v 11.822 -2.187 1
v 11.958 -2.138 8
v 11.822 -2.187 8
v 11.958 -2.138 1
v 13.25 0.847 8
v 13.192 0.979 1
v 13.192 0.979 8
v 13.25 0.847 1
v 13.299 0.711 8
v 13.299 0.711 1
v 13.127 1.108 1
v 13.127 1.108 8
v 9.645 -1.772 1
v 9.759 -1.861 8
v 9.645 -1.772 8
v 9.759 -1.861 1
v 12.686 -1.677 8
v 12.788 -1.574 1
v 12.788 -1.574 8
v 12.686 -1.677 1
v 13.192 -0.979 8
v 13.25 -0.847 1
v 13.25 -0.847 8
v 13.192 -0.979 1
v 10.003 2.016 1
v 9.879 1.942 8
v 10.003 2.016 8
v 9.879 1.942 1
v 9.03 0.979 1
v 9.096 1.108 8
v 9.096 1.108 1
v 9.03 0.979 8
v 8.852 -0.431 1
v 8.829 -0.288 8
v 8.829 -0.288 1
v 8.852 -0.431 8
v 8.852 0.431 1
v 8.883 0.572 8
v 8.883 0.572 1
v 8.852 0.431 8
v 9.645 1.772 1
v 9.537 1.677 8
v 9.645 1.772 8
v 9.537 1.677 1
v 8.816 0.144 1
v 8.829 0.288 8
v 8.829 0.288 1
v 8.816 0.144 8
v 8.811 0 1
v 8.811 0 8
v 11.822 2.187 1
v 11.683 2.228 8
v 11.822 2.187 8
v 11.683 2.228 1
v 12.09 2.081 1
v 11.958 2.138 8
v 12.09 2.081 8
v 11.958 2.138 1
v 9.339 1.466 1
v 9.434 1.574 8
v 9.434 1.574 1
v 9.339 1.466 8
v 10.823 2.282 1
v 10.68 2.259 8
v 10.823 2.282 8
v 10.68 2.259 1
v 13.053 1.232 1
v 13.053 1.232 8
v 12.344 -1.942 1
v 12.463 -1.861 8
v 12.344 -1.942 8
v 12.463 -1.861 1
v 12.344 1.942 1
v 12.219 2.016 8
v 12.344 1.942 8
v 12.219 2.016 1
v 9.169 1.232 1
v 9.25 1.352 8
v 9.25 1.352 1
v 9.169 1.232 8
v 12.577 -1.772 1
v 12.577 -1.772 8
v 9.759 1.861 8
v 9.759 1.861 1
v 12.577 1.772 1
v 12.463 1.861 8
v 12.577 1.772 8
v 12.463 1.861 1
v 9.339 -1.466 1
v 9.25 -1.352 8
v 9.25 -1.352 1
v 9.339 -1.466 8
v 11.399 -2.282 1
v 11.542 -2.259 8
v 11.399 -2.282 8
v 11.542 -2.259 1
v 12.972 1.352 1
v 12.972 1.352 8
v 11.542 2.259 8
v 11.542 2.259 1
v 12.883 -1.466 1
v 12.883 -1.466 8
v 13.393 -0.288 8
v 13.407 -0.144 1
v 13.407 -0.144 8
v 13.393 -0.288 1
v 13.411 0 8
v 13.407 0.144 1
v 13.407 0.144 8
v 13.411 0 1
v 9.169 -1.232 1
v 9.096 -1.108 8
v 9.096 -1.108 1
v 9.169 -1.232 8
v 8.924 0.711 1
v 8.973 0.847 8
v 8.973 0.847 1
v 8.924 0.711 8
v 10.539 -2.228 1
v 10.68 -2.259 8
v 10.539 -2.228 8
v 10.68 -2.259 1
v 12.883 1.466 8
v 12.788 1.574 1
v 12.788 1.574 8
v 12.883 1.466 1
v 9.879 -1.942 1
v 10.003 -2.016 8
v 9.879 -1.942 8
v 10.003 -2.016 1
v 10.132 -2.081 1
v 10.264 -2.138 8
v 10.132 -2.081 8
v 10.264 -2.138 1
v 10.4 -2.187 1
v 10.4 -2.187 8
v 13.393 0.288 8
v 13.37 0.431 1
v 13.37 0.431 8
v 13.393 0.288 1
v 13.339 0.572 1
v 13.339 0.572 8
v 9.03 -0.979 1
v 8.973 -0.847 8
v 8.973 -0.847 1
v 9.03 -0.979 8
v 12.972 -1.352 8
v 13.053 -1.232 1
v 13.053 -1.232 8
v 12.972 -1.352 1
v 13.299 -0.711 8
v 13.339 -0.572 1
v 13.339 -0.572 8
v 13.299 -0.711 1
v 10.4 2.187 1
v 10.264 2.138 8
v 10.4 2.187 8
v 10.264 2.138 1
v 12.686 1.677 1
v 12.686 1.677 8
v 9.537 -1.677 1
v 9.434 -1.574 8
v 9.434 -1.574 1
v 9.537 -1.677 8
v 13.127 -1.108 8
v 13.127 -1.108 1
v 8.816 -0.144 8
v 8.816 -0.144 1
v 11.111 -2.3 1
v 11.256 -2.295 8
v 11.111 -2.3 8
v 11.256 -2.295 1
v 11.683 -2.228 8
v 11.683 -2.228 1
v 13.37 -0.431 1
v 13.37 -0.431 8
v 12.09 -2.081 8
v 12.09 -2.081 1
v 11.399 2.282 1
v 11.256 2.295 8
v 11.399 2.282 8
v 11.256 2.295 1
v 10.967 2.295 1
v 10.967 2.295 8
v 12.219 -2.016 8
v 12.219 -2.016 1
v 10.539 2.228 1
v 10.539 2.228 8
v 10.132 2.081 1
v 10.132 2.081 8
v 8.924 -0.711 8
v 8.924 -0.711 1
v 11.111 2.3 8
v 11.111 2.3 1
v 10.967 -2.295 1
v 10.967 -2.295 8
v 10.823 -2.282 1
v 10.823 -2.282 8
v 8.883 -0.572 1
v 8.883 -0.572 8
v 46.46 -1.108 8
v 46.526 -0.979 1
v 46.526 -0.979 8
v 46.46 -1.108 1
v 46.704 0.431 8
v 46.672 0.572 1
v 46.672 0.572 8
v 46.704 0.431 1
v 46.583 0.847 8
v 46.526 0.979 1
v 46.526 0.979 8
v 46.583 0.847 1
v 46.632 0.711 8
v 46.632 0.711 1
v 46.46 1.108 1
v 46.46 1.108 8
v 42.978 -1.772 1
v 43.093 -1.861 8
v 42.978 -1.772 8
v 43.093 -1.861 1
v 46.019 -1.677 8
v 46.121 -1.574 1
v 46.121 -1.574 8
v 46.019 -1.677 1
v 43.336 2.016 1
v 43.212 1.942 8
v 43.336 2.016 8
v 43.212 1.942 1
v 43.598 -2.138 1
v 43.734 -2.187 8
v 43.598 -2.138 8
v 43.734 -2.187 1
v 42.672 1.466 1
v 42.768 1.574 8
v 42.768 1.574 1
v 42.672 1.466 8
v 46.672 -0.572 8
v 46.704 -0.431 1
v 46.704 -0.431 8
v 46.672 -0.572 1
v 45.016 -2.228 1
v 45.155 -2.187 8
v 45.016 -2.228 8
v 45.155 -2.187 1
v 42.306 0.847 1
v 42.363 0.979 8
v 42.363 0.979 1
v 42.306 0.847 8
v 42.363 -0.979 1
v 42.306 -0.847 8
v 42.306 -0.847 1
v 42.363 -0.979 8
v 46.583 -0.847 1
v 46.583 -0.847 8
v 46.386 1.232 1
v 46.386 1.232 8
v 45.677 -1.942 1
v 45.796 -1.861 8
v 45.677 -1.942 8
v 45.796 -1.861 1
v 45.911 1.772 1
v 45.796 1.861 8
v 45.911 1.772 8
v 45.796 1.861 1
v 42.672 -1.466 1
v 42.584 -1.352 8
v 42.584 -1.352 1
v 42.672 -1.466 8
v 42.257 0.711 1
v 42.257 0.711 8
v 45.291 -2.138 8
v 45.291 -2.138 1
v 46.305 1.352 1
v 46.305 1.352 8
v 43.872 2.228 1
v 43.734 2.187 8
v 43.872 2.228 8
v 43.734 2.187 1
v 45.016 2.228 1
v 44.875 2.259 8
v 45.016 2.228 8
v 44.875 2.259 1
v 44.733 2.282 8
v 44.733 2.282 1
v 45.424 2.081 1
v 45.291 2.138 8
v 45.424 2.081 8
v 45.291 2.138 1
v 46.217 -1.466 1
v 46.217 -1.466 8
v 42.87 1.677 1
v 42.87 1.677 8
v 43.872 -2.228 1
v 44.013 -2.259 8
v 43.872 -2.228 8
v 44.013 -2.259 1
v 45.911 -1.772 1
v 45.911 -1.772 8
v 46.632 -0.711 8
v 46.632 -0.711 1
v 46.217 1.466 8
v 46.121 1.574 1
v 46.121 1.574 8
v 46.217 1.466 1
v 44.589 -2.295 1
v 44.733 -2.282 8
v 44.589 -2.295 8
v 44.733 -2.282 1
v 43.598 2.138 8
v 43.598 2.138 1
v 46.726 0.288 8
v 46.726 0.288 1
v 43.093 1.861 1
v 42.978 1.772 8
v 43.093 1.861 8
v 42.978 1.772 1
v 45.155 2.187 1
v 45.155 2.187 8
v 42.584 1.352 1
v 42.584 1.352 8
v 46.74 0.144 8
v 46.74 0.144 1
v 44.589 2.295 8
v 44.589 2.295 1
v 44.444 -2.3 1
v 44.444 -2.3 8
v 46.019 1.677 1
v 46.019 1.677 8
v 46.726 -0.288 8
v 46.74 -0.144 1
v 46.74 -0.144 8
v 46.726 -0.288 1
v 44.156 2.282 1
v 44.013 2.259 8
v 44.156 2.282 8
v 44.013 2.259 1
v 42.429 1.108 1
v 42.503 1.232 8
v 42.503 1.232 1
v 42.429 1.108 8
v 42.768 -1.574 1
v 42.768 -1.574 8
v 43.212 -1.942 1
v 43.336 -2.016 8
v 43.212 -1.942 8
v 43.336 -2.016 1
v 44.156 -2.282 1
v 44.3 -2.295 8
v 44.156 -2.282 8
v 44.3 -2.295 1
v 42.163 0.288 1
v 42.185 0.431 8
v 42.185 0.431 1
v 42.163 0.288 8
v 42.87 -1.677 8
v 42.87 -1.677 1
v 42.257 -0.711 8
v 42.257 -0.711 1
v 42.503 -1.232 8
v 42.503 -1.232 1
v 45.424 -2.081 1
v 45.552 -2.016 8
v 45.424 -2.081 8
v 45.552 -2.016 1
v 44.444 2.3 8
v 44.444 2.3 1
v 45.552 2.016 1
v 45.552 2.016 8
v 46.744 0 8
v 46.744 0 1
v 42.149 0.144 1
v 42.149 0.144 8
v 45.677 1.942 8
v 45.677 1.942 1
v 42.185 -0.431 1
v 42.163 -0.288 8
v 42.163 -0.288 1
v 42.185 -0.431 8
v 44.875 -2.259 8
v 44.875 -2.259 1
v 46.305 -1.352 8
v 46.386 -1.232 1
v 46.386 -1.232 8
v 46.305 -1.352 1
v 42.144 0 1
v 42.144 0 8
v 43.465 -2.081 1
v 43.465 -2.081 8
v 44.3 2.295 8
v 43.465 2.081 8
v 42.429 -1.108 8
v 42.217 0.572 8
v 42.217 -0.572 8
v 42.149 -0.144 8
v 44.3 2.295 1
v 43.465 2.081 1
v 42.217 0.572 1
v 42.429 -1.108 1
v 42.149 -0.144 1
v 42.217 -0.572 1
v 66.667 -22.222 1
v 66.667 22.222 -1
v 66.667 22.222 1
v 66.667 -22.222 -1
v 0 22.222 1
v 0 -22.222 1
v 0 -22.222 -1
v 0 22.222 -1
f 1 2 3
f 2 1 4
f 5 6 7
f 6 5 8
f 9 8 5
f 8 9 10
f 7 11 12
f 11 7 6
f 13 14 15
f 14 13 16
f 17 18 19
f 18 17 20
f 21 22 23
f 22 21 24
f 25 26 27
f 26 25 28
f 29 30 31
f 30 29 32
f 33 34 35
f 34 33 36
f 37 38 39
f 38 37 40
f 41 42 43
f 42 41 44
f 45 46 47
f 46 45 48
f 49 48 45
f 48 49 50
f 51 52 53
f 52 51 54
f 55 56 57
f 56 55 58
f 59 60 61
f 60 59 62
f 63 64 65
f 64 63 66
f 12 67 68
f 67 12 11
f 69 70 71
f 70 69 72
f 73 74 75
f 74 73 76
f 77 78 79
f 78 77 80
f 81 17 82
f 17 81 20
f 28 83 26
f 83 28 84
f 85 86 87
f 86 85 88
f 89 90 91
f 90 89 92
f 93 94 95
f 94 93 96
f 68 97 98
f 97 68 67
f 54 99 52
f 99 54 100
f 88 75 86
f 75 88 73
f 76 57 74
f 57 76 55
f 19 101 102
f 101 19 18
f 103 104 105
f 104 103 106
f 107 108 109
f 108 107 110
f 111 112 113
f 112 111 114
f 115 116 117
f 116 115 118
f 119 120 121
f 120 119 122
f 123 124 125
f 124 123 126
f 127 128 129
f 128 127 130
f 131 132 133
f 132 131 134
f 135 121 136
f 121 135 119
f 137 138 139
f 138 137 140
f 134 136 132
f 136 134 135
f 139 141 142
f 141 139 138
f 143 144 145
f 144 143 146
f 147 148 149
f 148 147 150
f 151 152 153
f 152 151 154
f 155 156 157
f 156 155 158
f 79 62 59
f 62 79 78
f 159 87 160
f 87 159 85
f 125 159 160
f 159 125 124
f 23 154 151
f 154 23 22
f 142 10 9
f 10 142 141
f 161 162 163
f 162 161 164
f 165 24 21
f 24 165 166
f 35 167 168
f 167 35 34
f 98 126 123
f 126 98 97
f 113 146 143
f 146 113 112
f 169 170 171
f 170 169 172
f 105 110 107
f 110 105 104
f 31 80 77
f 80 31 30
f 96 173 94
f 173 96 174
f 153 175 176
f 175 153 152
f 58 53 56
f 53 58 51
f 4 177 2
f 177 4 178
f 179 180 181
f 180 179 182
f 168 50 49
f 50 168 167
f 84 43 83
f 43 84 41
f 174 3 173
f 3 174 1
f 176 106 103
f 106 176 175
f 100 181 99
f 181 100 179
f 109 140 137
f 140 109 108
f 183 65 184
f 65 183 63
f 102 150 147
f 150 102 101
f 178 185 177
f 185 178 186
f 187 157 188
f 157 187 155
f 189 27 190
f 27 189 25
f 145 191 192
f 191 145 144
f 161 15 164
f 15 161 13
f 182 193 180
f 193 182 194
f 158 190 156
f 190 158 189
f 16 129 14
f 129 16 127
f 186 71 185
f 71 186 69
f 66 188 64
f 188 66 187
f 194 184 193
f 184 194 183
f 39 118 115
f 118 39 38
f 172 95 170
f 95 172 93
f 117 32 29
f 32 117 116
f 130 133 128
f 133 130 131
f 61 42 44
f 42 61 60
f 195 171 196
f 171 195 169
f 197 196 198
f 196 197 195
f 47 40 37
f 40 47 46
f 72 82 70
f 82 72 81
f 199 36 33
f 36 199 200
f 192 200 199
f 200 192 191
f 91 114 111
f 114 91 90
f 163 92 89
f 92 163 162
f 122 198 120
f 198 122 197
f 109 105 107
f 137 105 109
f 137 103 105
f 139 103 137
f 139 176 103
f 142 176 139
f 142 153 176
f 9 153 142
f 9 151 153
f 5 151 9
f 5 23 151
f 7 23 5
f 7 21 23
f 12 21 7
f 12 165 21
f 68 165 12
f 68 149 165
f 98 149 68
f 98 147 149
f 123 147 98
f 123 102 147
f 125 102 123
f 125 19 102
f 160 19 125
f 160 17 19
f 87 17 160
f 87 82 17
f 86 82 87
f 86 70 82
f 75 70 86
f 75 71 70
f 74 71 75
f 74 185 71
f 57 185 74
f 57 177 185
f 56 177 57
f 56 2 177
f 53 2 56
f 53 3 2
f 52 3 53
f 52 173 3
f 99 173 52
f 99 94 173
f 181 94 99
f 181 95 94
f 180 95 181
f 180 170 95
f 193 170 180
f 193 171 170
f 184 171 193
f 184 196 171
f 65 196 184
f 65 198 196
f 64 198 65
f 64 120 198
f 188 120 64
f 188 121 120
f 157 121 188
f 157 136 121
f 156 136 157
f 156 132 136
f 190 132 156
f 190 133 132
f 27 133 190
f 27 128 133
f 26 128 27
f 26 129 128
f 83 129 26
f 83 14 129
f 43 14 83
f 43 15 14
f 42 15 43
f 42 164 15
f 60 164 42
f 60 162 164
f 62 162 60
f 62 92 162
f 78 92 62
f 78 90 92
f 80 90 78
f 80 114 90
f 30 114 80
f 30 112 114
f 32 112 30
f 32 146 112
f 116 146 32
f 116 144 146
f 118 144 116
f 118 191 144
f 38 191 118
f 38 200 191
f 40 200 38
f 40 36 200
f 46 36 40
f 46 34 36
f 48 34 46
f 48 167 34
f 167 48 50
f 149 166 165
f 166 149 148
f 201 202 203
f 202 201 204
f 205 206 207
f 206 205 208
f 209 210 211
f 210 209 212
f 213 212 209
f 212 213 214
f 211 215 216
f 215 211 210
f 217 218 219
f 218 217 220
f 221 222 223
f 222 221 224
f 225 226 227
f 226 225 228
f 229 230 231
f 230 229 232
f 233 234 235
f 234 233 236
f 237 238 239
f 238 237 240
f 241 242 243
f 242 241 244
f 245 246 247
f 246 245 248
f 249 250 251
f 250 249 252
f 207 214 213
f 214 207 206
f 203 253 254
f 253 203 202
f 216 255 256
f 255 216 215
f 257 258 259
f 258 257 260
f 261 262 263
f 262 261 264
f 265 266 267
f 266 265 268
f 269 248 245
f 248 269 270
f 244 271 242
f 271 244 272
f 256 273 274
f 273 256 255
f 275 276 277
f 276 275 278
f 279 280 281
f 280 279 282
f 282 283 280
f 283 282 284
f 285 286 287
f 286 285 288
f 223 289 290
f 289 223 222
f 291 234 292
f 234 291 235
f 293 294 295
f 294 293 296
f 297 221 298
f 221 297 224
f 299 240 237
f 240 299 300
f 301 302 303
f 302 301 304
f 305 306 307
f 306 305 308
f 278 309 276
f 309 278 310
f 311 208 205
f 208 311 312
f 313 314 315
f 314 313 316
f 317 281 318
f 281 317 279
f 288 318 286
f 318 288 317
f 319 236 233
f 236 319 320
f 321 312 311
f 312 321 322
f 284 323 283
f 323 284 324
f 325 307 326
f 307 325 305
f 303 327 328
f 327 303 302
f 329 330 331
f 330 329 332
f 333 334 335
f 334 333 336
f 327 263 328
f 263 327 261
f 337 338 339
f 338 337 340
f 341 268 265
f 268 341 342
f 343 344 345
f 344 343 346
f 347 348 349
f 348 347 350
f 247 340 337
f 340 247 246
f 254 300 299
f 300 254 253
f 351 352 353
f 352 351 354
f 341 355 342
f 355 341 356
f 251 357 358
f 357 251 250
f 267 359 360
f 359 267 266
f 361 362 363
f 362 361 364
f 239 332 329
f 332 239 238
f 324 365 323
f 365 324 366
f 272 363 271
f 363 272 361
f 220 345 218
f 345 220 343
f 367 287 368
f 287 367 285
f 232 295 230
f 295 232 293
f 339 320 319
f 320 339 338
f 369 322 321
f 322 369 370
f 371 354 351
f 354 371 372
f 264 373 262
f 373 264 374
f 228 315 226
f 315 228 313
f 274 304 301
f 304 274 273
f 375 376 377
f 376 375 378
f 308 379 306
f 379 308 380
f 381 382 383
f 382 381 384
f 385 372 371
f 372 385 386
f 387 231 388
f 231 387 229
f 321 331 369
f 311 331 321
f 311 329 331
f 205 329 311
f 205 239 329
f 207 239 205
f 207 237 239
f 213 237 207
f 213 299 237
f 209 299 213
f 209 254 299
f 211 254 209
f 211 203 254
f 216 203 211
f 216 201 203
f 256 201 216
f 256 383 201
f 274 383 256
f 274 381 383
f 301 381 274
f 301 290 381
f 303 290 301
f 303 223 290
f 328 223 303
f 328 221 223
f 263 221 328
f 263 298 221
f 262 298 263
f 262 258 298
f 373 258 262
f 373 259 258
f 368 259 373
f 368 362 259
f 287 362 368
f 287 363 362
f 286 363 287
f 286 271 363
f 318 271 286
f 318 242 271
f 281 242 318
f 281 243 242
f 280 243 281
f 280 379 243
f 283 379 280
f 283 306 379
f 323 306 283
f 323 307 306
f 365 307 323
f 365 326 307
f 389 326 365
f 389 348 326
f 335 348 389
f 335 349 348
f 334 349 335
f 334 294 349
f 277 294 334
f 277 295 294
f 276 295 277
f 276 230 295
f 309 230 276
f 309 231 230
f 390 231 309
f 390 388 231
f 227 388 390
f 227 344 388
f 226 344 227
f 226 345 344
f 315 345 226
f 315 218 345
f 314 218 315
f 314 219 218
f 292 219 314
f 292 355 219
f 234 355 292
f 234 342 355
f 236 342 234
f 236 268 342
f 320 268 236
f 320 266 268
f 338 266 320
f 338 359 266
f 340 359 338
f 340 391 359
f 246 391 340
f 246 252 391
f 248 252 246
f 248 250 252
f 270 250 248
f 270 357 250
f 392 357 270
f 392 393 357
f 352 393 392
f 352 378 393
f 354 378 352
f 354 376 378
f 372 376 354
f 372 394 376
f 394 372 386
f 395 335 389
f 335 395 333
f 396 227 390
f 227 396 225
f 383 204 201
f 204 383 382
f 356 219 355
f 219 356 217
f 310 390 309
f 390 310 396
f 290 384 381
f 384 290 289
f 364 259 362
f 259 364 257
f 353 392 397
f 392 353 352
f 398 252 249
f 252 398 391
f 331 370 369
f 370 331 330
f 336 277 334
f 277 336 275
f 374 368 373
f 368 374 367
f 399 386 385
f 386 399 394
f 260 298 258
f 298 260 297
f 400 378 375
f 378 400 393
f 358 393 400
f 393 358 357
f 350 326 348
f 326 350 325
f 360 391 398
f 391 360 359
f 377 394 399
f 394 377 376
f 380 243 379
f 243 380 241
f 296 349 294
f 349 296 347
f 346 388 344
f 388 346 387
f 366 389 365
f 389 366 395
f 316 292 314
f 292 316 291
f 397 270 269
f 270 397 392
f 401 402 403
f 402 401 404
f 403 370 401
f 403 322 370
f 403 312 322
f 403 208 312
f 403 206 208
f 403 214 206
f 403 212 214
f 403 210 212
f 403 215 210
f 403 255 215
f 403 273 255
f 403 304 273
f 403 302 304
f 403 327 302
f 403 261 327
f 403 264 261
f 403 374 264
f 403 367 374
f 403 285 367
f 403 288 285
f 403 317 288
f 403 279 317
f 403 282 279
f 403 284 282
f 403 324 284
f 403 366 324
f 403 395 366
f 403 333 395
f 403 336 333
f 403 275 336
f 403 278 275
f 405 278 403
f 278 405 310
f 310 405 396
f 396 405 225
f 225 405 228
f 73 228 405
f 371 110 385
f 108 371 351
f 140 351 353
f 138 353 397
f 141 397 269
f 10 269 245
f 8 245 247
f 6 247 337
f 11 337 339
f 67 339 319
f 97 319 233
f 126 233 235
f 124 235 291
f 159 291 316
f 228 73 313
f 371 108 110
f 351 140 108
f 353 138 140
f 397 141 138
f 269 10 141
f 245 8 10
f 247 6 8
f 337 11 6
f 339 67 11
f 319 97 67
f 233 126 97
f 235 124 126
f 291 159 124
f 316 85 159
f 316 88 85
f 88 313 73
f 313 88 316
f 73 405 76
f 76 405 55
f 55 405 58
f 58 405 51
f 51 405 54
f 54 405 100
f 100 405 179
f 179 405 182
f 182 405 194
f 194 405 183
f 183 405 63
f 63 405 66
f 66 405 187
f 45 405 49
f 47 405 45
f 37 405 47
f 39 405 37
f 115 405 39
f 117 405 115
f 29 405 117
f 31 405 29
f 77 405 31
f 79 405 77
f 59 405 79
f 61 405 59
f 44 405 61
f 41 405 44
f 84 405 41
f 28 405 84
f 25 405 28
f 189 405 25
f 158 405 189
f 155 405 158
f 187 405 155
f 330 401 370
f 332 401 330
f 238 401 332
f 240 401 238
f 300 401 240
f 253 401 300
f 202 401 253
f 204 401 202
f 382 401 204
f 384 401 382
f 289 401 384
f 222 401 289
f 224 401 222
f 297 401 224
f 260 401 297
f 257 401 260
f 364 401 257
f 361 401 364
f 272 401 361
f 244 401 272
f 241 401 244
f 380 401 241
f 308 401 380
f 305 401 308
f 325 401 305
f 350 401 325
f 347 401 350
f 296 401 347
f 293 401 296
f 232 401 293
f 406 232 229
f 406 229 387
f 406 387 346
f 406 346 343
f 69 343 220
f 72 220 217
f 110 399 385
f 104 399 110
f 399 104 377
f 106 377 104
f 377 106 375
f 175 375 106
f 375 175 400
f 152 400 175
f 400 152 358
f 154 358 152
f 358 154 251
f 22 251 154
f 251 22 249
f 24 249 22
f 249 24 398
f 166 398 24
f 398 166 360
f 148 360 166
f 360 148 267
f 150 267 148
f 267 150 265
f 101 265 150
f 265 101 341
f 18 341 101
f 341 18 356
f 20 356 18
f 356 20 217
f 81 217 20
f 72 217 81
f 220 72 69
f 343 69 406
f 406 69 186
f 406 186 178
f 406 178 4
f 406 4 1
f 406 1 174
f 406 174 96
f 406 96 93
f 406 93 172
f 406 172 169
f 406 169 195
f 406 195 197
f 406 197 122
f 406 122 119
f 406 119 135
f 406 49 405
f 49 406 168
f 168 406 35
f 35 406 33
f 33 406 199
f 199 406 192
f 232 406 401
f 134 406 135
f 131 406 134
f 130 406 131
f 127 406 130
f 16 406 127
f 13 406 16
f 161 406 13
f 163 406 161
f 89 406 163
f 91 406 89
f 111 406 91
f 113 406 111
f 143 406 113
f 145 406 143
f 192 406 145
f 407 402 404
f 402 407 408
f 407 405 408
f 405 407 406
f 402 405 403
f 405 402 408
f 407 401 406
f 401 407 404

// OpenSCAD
$fn = 100;

include <MCAD/involute_gears.scad>

MAKE_BASE = true;
MAKE_GEARS = false;
MAKE = [true, false, true];

GEARS = [
     [10,  5.55556, [1,1,0]],
     [15,  8.33333, [1,0,1]],
     [20, 11.11111, [0,1,1]]
     ];

COLOR_OF_BASE = [0.5, 0.5, 0.5];

function mygear_nteeth(gear) = gear[0];
function mygear_radius(gear) = gear[1];
function mygear_color(gear) = gear[2];

function mygear_max_radius(idx, val) = (idx >= len(GEARS)) ? val : ( !MAKE[idx] ? mygear_max_radius(idx+1, val) : (val < GEARS[idx][1] ? mygear_max_radius(idx + 1, GEARS[idx][1]) : mygear_max_radius(idx+1, val) ) );

function _mygear_0(idx, add) = (idx >= len(GEARS)) ? [] : MAKE[idx] ? concat([[idx, add + GEARS[idx][1]]], _mygear_0(idx + 1, add + 2 * GEARS[idx][1])) : _mygear_0(idx + 1, add);

function mygear_accumulate_radius() = _mygear_0(0, 0);

function sum_printable(idx) = (idx >= len(MAKE)) ? 0 : ( ((MAKE[idx]) ? 2*GEARS[idx][1] : 0) + sum_printable(idx + 1));

module up()
{
     translate([0, 0, 2])
     {
          children();
     }
}

module make_gear(teeth)
{
     difference()
     {
          linear_extrude(5)
          {
               gear(number_of_teeth = teeth, circular_pitch = 200, flat=true, bore_diameter = 5 / 2);
          }
          if(teeth / 5 >= 3)
          {
               nsteps = 6;
               for(i = [0:1:nsteps])
               {
                    rotate([0, 0, 360 / nsteps * i])
                    {
                         translate([teeth/3.2,0,-1])
                         {
                              cylinder(r=teeth / 10, h = 10);
                         }
                    }
               }
          }
     }
     rotate([0,0,360/12])
     {
          translate([teeth/2.9,0,0])
          {
               cylinder(r=10 / 12, h=10);
          }
     }
}

module mygear_spread_children(domake)
{
     radii = mygear_accumulate_radius();
     if(MAKE[domake])
     {
          move = lookup(domake, radii);
          translate([move, 0, 0])
          {
               rotate([0, 0, 360 / 10 * 0.5])
               {
                    children();
               }
          }
     }
}

if(MAKE_GEARS) scale([2,2,1]) up(2)
               {
                    for(domake = [0 : 1 : len(MAKE) - 1])
                    {
                         if(MAKE[domake])
                         {
                              mygear_spread_children(domake) color(mygear_color(GEARS[domake]))
                              {
                                   make_gear(mygear_nteeth(GEARS[domake]));
                              }
                         }
                    }
               }

HOLE_RADIUS = (2.5 - 0.2) / 2;

if(MAKE_BASE)
{
     BASE_LEN = sum_printable(0);
     BASE_WID = mygear_max_radius(0, 0);
     color(COLOR_OF_BASE)
     {
          scale([2,2,1]) union() {
               translate([BASE_LEN/2,0,0])
               {
                    cube([BASE_LEN,BASE_WID*2,2], center=true);
               }
               for(domake = [0 : 1 : len(MAKE) - 1])
               {
                    if(MAKE[domake])
                    {
                         mygear_spread_children(domake) cylinder(r = HOLE_RADIUS, h=8);
                    }
               }
          }
     }
}
